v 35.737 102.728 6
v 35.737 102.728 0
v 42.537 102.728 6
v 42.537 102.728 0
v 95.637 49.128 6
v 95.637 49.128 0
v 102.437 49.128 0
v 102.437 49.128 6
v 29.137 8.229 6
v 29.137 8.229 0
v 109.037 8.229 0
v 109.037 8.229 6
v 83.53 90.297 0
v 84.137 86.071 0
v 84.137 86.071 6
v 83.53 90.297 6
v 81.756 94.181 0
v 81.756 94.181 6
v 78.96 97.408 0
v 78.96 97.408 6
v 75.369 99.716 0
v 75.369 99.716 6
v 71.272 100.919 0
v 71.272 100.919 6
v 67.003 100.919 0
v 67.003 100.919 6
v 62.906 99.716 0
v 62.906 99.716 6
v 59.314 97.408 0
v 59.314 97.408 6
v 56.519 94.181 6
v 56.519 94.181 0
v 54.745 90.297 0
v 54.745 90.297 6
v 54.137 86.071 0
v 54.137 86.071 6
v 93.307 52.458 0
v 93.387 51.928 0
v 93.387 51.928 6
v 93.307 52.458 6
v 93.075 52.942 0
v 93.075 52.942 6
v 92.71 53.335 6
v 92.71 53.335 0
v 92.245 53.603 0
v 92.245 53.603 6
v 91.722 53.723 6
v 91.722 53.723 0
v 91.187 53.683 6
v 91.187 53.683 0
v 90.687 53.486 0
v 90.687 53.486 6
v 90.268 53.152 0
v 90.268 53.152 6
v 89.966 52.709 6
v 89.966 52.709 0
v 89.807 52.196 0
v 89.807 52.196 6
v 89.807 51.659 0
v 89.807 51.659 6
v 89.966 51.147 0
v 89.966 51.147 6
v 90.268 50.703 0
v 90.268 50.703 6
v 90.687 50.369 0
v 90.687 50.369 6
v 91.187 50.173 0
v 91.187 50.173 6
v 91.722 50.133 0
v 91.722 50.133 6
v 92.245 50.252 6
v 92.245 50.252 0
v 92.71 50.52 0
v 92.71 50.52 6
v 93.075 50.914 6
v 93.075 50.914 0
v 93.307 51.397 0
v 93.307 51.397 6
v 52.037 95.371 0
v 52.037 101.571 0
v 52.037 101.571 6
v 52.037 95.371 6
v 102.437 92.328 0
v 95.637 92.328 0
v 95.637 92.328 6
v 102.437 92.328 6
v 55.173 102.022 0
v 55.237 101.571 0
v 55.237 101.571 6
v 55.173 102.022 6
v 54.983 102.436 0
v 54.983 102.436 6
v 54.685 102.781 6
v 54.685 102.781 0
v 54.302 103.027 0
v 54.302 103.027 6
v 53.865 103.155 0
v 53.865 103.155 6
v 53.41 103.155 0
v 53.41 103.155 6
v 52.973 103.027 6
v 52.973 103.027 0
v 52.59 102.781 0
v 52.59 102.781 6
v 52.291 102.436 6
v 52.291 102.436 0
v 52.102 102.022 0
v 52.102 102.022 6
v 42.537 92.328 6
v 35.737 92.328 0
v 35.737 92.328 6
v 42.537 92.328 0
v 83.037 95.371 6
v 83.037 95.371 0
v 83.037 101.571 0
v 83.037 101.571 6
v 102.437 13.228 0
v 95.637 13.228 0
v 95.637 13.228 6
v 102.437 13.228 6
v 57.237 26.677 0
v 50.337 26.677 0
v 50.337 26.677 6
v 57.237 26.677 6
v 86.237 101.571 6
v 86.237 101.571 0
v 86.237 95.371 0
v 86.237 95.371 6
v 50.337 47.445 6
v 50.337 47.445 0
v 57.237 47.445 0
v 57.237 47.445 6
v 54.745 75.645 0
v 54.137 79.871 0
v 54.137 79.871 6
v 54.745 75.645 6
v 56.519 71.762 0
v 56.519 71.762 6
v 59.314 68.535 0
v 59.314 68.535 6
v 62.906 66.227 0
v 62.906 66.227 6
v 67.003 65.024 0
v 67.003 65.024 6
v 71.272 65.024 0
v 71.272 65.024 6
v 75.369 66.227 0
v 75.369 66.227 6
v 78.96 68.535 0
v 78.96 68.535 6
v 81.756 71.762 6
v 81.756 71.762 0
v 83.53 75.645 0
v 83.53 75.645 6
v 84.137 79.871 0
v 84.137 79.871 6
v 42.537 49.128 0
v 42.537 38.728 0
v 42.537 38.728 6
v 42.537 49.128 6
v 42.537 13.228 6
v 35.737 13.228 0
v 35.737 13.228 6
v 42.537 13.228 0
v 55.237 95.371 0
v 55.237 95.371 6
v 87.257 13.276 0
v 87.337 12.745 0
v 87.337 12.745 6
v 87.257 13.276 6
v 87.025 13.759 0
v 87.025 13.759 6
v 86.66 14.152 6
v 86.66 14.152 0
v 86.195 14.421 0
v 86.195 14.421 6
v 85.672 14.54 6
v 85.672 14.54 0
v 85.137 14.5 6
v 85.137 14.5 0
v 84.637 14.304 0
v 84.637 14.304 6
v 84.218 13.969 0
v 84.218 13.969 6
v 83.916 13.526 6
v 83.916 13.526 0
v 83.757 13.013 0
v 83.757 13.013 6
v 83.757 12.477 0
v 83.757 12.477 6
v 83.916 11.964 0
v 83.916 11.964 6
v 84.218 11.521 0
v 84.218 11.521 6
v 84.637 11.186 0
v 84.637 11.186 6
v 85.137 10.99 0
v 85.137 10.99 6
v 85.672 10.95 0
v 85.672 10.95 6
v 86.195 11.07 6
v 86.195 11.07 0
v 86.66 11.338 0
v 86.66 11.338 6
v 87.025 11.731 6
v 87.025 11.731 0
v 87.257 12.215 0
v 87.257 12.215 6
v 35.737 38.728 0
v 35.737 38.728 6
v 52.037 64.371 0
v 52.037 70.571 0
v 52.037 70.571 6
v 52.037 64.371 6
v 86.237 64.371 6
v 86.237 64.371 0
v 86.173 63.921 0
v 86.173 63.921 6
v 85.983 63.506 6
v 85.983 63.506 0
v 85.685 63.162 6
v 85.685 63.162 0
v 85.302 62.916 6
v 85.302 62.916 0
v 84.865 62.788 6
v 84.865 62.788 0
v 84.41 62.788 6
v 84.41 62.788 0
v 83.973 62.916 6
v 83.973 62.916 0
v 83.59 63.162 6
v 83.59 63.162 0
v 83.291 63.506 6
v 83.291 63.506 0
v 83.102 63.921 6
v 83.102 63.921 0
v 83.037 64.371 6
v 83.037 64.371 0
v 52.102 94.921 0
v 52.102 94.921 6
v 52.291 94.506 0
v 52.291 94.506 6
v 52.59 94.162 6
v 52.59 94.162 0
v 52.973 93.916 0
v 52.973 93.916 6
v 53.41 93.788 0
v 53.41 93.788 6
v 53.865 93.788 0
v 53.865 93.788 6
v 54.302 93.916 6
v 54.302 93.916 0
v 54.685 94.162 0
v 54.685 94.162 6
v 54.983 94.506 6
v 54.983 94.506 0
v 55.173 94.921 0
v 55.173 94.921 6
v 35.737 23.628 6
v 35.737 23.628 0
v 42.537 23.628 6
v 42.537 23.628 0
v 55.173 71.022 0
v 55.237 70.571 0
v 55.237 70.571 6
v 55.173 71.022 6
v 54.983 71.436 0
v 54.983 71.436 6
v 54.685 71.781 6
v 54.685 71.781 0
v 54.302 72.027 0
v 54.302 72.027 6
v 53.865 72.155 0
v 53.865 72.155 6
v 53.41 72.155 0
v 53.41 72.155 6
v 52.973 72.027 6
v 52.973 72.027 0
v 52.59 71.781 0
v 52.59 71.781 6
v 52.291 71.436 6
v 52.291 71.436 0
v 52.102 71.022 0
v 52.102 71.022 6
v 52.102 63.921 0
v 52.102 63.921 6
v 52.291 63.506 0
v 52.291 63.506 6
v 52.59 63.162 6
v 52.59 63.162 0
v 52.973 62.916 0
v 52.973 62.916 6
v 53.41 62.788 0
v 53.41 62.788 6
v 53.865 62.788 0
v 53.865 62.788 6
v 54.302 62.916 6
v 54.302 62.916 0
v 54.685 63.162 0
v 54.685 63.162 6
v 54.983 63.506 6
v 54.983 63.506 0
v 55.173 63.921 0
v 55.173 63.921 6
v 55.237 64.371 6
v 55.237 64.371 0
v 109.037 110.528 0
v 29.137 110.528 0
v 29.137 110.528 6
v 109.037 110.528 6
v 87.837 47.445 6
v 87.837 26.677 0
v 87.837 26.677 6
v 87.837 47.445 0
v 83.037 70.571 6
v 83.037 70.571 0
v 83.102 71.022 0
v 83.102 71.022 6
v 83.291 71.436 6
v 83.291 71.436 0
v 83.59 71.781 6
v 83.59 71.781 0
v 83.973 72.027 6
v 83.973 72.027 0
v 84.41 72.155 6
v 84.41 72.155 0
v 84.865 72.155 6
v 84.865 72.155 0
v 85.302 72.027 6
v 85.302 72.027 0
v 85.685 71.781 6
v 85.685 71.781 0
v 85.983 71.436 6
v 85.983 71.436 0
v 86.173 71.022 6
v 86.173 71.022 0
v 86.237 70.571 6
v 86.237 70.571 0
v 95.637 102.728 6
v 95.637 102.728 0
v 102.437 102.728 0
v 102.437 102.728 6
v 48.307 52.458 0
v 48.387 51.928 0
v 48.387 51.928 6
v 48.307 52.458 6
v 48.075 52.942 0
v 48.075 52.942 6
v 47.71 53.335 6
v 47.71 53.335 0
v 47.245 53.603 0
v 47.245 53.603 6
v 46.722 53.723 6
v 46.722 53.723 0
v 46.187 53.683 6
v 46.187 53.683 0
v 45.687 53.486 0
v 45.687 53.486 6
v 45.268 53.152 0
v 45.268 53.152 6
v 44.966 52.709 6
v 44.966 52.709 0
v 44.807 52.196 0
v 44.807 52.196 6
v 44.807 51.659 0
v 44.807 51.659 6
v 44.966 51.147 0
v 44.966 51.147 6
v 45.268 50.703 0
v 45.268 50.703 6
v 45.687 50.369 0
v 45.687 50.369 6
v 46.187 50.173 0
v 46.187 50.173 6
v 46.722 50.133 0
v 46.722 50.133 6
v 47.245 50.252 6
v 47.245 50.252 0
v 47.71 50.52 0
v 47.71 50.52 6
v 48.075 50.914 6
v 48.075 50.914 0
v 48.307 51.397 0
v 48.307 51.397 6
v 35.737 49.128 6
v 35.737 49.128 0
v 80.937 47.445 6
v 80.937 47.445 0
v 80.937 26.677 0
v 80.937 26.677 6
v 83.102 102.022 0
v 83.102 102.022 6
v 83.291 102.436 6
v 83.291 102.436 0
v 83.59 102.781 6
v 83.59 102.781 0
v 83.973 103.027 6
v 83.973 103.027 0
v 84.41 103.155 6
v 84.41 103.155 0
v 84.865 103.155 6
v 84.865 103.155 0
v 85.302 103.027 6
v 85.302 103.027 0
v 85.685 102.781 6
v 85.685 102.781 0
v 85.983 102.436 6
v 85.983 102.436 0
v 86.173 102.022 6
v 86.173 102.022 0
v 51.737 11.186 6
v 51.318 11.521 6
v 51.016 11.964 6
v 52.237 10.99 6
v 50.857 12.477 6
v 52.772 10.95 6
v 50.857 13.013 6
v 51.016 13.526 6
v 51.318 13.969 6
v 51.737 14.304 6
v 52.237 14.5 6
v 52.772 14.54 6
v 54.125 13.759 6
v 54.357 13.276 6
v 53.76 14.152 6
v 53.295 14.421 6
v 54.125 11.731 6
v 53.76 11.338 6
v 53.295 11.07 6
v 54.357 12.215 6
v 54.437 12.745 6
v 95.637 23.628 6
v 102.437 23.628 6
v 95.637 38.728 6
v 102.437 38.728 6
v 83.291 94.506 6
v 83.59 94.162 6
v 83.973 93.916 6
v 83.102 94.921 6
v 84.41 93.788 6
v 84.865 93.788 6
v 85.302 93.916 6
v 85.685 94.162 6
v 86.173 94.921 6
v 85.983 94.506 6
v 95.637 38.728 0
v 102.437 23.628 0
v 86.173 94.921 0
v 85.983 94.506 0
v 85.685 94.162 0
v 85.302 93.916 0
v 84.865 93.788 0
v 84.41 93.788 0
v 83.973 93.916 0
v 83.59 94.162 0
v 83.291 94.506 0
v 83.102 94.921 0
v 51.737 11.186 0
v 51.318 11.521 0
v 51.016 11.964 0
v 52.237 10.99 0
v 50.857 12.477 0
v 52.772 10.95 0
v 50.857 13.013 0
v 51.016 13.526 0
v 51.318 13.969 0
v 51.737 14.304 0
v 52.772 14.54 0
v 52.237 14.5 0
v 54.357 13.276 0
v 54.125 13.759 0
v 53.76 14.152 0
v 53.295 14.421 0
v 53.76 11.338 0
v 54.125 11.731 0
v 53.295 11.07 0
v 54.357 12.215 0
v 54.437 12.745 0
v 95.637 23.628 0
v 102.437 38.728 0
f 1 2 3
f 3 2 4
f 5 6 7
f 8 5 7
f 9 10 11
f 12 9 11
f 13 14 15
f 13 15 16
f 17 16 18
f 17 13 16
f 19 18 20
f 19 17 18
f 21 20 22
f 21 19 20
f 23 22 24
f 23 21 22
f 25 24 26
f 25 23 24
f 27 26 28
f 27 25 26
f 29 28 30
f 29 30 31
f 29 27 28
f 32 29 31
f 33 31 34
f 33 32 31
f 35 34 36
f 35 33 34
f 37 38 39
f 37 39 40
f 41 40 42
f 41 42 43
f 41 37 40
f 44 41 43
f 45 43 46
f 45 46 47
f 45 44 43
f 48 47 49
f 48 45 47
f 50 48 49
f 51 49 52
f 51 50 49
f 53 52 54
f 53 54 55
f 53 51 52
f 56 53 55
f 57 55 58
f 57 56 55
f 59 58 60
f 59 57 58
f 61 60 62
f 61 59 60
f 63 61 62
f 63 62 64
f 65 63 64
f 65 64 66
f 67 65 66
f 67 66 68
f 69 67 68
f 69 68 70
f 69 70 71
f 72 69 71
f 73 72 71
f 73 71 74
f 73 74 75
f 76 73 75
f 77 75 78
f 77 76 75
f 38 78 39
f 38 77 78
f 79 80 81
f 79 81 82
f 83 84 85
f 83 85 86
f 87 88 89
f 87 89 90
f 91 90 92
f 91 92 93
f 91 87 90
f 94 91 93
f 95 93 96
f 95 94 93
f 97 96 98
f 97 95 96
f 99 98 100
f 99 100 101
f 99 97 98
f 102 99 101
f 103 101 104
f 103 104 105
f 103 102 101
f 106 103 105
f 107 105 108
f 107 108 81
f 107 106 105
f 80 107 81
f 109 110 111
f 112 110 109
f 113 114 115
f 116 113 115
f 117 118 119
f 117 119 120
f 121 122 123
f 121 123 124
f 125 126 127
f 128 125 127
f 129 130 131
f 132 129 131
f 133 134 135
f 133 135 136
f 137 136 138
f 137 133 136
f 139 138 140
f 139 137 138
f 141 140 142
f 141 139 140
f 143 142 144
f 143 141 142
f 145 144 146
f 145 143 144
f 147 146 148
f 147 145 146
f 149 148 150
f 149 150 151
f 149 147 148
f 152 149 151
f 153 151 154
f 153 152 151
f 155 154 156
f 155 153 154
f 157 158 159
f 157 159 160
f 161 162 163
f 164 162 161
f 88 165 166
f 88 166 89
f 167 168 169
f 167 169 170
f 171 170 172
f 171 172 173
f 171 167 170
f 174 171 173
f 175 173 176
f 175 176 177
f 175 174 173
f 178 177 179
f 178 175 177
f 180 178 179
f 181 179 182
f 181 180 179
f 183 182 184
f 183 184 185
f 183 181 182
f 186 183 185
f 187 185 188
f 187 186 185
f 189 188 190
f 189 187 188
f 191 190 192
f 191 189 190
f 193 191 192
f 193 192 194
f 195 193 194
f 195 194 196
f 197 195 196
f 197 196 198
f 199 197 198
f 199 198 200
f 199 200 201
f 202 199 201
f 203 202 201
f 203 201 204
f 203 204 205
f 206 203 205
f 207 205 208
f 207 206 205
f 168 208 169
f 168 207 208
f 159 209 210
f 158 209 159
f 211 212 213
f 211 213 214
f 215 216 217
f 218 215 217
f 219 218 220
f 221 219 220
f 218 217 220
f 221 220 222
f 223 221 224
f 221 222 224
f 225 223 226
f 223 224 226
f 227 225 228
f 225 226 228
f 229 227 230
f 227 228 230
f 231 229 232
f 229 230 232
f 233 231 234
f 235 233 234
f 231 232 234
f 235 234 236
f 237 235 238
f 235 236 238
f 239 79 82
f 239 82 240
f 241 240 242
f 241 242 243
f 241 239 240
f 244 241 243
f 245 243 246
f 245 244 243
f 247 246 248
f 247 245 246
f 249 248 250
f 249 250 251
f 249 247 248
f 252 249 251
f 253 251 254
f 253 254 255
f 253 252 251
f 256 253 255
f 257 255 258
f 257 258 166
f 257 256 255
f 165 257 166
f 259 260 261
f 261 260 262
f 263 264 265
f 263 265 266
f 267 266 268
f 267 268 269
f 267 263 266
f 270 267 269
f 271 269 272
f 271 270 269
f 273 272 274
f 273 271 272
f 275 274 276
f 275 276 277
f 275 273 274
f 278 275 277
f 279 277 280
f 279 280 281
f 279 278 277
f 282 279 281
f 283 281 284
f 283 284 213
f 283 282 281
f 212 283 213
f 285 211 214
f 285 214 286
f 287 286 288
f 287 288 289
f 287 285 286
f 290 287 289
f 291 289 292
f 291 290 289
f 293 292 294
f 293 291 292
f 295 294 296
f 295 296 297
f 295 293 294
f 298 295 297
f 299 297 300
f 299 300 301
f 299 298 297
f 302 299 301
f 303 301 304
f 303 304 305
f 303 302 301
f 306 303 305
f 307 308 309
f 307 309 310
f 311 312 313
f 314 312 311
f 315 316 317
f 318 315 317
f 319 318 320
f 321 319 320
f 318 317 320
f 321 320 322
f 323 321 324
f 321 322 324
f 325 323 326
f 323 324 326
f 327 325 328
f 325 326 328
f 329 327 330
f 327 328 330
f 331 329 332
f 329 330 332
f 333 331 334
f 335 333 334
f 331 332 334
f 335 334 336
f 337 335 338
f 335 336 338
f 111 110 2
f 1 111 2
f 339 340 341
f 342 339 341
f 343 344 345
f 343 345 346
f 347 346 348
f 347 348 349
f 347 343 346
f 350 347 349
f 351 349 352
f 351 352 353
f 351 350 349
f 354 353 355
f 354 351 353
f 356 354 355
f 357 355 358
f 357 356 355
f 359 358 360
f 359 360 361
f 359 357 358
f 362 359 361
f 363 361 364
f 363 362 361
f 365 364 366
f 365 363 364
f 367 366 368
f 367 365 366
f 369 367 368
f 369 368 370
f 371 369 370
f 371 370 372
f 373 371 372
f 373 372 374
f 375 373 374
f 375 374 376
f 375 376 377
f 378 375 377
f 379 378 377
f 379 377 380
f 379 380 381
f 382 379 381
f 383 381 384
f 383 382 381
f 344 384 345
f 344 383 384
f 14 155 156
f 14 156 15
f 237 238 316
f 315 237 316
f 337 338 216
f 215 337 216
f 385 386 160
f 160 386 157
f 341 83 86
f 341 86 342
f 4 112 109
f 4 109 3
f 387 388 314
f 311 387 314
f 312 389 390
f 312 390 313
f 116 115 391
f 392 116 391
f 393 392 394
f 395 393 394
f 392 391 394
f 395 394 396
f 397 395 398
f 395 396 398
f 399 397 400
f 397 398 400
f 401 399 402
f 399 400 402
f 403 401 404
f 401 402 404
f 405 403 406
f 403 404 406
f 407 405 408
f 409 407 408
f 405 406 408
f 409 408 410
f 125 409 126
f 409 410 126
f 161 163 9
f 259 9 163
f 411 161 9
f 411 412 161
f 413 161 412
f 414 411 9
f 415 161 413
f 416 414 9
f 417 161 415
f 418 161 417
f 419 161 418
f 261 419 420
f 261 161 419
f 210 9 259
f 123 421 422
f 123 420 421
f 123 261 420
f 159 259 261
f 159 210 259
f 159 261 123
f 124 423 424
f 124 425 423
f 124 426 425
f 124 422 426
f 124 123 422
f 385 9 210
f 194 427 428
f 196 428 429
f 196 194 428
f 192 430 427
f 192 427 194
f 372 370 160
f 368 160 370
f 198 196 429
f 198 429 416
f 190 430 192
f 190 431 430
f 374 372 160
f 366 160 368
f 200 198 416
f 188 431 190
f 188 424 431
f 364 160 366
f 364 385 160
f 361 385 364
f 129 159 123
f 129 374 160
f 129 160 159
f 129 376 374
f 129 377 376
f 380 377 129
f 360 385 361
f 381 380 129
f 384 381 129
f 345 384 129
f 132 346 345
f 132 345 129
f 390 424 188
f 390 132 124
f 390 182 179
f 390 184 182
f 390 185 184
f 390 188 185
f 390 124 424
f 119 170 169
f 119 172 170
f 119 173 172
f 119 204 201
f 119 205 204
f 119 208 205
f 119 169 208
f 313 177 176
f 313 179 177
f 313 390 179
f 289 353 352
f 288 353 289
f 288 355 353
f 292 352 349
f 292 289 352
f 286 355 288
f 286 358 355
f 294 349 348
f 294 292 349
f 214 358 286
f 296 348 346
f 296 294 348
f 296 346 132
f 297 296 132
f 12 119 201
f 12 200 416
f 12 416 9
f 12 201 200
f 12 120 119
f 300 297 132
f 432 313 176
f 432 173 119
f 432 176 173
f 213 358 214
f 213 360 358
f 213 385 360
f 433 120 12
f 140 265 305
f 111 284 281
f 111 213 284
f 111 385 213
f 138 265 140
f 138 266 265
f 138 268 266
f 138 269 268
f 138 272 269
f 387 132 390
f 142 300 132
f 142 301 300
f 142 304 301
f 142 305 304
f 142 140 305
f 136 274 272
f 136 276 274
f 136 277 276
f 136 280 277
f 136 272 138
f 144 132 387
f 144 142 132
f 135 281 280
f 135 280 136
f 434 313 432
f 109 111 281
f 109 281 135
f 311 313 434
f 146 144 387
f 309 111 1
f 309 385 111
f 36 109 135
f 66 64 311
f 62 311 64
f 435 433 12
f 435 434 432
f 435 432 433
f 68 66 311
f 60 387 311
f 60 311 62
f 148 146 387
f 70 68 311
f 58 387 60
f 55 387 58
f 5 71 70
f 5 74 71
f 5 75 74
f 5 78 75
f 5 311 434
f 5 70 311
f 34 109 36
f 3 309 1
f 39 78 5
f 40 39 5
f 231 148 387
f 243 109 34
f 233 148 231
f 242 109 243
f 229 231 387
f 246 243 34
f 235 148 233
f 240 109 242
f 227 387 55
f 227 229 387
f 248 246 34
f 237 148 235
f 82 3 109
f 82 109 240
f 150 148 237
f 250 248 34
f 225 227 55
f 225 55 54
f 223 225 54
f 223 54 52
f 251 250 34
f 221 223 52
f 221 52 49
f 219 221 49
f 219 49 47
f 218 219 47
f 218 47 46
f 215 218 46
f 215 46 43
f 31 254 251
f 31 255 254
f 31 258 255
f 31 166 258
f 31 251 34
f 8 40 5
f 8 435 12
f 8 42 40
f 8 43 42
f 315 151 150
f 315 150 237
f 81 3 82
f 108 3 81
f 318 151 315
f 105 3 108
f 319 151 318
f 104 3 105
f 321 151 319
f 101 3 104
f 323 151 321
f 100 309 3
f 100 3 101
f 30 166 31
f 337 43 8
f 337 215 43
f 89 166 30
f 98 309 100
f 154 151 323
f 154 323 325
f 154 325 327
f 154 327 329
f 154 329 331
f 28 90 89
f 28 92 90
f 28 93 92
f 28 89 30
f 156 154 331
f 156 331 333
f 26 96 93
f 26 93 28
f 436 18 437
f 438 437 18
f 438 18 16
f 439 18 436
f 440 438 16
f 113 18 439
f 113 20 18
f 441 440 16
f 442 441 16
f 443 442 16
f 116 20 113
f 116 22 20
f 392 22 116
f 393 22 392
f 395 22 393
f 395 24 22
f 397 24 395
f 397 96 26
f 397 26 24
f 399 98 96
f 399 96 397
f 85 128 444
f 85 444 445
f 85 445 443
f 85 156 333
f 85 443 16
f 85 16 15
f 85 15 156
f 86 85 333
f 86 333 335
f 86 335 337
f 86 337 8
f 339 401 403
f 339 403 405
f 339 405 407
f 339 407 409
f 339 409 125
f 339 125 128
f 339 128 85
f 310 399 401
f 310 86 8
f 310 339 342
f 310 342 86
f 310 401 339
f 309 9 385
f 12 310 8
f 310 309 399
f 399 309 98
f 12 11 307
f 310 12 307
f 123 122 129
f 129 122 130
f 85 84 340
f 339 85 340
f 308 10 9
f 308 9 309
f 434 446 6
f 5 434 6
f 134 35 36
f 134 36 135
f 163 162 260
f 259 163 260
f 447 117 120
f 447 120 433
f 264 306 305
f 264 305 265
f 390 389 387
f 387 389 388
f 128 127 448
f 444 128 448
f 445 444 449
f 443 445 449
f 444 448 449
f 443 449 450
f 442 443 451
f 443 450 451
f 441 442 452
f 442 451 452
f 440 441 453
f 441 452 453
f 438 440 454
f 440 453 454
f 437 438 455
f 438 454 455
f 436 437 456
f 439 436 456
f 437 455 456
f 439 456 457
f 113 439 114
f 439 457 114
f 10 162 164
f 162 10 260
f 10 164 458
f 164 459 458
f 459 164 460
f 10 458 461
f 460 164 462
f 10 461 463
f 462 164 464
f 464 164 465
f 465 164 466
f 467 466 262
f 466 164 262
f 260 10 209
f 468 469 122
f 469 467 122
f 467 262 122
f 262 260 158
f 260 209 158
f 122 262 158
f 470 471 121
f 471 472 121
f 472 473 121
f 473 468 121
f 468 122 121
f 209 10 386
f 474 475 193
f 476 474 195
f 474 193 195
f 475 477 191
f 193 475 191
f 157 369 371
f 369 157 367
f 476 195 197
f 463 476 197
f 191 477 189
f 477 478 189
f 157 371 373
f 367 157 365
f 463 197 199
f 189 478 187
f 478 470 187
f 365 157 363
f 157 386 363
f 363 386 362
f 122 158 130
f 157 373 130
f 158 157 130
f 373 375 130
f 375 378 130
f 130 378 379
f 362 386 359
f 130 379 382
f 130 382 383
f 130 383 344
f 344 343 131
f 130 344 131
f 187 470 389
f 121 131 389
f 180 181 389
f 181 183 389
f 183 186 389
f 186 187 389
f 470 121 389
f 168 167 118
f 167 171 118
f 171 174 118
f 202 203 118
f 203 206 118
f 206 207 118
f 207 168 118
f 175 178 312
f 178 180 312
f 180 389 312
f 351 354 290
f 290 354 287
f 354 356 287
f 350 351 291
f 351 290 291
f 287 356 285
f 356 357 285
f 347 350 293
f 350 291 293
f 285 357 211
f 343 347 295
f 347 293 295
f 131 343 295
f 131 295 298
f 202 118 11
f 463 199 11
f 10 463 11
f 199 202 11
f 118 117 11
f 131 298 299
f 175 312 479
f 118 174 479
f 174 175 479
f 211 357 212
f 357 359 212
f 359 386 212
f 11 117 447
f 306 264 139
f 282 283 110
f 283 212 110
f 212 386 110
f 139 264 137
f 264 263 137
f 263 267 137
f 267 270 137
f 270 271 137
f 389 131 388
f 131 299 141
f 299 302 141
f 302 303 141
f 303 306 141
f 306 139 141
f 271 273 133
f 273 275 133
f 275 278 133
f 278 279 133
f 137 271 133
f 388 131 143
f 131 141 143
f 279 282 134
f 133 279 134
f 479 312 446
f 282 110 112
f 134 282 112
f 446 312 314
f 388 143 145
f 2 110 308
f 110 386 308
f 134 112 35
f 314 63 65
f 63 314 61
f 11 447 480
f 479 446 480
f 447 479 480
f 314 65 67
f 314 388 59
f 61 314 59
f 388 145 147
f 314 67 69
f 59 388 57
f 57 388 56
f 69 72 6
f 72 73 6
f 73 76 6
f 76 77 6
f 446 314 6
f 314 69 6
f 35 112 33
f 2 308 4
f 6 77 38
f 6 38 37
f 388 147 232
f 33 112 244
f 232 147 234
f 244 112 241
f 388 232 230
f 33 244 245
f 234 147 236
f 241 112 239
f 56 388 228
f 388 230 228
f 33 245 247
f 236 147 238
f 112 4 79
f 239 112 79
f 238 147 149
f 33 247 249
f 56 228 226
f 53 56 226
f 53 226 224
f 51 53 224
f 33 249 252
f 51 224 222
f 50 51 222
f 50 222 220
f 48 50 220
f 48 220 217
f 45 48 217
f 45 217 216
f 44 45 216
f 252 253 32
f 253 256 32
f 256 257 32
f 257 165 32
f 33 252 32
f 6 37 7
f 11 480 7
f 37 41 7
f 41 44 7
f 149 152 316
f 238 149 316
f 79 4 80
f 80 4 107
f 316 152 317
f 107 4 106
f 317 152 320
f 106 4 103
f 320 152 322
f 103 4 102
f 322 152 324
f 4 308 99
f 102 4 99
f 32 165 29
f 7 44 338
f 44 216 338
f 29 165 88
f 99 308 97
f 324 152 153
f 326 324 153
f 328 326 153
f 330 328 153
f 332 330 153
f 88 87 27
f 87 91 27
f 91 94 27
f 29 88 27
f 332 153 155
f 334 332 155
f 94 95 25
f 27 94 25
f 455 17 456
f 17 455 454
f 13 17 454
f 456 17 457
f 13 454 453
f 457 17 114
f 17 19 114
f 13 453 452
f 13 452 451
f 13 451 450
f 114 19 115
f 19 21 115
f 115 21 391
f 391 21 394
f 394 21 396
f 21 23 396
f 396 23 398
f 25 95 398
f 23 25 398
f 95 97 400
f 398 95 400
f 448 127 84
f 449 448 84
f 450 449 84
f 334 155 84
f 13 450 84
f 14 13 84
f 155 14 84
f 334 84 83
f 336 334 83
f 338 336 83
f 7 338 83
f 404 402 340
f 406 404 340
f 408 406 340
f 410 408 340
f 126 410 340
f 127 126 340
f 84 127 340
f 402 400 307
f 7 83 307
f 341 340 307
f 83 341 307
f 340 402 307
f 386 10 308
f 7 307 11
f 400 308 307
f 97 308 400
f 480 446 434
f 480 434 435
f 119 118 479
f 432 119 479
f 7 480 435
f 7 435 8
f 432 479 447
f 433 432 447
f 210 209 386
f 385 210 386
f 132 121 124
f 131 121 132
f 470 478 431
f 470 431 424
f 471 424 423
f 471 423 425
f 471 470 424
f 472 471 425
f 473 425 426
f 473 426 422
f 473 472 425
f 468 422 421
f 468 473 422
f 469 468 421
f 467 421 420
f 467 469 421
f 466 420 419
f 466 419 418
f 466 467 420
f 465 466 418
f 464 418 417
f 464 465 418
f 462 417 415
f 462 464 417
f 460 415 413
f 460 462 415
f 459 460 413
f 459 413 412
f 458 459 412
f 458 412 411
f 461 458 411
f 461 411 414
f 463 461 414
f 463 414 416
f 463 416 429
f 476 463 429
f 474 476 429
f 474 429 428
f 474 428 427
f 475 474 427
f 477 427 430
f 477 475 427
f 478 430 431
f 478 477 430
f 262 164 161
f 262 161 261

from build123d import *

# Parameters (mm, degrees)
MODEL_W                  = 79.9
MODEL_H                  = 102.298269881
MODEL_R                  = 1.8
MODEL_W_2                = 6.8
MODEL_H_2                = 10.4
MODEL_W_3                = 6.9
MODEL_H_3                = 20.768459162
RESSALTO_EXTRUS_O1_DEPTH = 6


with BuildPart() as part:
    # Model → Ressalto-extrusão1 (new body)
    with BuildSketch(Plane.XY):
        with Locations((69.087325958, 59.378502518)):
            Rectangle(MODEL_W, MODEL_H)
        with Locations((52.637325958, 12.745101048)):
            Circle(MODEL_R, mode=Mode.SUBTRACT)
        with Locations((85.537325958, 12.745101048)):
            Circle(MODEL_R, mode=Mode.SUBTRACT)
        with Locations((91.587325958, 51.927637459)):
            Circle(MODEL_R, mode=Mode.SUBTRACT)
        with Locations((46.587325958, 51.927637459)):
            Circle(MODEL_R, mode=Mode.SUBTRACT)
        with Locations((99.037325958, 97.527637459)):
            Rectangle(MODEL_W_2, MODEL_H_2, mode=Mode.SUBTRACT)
        with Locations((39.137325958, 97.527637459)):
            Rectangle(MODEL_W_2, MODEL_H_2, mode=Mode.SUBTRACT)
        with Locations((99.037325958, 43.927637459)):
            Rectangle(MODEL_W_2, MODEL_H_2, mode=Mode.SUBTRACT)
        with Locations((39.137325958, 18.427637459)):
            Rectangle(MODEL_W_2, MODEL_H_2, mode=Mode.SUBTRACT)
        with Locations((53.787325958, 37.060868969)):
            Rectangle(MODEL_W_3, MODEL_H_3, mode=Mode.SUBTRACT)
        with BuildLine():
            Line((52.037325958, 70.571372091), (52.037325958, 64.371372091))
            ThreePointArc((52.037325958, 64.371372091), (53.637325958, 62.771372091), (55.237325958, 64.371372091))
            Line((55.237325958, 64.371372091), (55.237325958, 70.571372091))
            ThreePointArc((55.237325958, 70.571372091), (53.637325958, 72.171372091), (52.037325958, 70.571372091))
        make_face(mode=Mode.SUBTRACT)
        with Locations((84.387325958, 37.060868969)):
            Rectangle(MODEL_W_3, MODEL_H_3, mode=Mode.SUBTRACT)
        with Locations((99.037325958, 18.427637459)):
            Rectangle(MODEL_W_2, MODEL_H_2, mode=Mode.SUBTRACT)
        with BuildLine():
            Line((86.237325958, 70.571372091), (86.237325958, 64.371372091))
            ThreePointArc((86.237325958, 64.371372091), (84.637325958, 62.771372091), (83.037325958, 64.371372091))
            Line((83.037325958, 64.371372091), (83.037325958, 70.571372091))
            ThreePointArc((83.037325958, 70.571372091), (84.637325958, 72.171372091), (86.237325958, 70.571372091))
        make_face(mode=Mode.SUBTRACT)
        with BuildLine():
            Line((86.237325958, 101.571372091), (86.237325958, 95.371372091))
            ThreePointArc((86.237325958, 95.371372091), (84.637325958, 93.771372091), (83.037325958, 95.371372091))
            Line((83.037325958, 95.371372091), (83.037325958, 101.571372091))
            ThreePointArc((83.037325958, 101.571372091), (84.637325958, 103.171372091), (86.237325958, 101.571372091))
        make_face(mode=Mode.SUBTRACT)
        with Locations((39.137325958, 43.927637459)):
            Rectangle(MODEL_W_2, MODEL_H_2, mode=Mode.SUBTRACT)
        with BuildLine():
            Line((52.037325958, 101.571372091), (52.037325958, 95.371372091))
            ThreePointArc((52.037325958, 95.371372091), (53.637325958, 93.771372091), (55.237325958, 95.371372091))
            Line((55.237325958, 95.371372091), (55.237325958, 101.571372091))
            ThreePointArc((55.237325958, 101.571372091), (53.637325958, 103.171372091), (52.037325958, 101.571372091))
        make_face(mode=Mode.SUBTRACT)
        with BuildLine():
            Line((54.137325958, 86.071372091), (54.137325958, 79.871372091))
            ThreePointArc((54.137325958, 79.871372091), (69.137325958, 64.871372091), (84.137325958, 79.871372091))
            Line((84.137325958, 79.871372091), (84.137325958, 86.071372091))
            ThreePointArc((84.137325958, 86.071372091), (69.137325958, 101.071372091), (54.137325958, 86.071372091))
        make_face(mode=Mode.SUBTRACT)
    extrude(amount=RESSALTO_EXTRUS_O1_DEPTH)


solid = part.part
